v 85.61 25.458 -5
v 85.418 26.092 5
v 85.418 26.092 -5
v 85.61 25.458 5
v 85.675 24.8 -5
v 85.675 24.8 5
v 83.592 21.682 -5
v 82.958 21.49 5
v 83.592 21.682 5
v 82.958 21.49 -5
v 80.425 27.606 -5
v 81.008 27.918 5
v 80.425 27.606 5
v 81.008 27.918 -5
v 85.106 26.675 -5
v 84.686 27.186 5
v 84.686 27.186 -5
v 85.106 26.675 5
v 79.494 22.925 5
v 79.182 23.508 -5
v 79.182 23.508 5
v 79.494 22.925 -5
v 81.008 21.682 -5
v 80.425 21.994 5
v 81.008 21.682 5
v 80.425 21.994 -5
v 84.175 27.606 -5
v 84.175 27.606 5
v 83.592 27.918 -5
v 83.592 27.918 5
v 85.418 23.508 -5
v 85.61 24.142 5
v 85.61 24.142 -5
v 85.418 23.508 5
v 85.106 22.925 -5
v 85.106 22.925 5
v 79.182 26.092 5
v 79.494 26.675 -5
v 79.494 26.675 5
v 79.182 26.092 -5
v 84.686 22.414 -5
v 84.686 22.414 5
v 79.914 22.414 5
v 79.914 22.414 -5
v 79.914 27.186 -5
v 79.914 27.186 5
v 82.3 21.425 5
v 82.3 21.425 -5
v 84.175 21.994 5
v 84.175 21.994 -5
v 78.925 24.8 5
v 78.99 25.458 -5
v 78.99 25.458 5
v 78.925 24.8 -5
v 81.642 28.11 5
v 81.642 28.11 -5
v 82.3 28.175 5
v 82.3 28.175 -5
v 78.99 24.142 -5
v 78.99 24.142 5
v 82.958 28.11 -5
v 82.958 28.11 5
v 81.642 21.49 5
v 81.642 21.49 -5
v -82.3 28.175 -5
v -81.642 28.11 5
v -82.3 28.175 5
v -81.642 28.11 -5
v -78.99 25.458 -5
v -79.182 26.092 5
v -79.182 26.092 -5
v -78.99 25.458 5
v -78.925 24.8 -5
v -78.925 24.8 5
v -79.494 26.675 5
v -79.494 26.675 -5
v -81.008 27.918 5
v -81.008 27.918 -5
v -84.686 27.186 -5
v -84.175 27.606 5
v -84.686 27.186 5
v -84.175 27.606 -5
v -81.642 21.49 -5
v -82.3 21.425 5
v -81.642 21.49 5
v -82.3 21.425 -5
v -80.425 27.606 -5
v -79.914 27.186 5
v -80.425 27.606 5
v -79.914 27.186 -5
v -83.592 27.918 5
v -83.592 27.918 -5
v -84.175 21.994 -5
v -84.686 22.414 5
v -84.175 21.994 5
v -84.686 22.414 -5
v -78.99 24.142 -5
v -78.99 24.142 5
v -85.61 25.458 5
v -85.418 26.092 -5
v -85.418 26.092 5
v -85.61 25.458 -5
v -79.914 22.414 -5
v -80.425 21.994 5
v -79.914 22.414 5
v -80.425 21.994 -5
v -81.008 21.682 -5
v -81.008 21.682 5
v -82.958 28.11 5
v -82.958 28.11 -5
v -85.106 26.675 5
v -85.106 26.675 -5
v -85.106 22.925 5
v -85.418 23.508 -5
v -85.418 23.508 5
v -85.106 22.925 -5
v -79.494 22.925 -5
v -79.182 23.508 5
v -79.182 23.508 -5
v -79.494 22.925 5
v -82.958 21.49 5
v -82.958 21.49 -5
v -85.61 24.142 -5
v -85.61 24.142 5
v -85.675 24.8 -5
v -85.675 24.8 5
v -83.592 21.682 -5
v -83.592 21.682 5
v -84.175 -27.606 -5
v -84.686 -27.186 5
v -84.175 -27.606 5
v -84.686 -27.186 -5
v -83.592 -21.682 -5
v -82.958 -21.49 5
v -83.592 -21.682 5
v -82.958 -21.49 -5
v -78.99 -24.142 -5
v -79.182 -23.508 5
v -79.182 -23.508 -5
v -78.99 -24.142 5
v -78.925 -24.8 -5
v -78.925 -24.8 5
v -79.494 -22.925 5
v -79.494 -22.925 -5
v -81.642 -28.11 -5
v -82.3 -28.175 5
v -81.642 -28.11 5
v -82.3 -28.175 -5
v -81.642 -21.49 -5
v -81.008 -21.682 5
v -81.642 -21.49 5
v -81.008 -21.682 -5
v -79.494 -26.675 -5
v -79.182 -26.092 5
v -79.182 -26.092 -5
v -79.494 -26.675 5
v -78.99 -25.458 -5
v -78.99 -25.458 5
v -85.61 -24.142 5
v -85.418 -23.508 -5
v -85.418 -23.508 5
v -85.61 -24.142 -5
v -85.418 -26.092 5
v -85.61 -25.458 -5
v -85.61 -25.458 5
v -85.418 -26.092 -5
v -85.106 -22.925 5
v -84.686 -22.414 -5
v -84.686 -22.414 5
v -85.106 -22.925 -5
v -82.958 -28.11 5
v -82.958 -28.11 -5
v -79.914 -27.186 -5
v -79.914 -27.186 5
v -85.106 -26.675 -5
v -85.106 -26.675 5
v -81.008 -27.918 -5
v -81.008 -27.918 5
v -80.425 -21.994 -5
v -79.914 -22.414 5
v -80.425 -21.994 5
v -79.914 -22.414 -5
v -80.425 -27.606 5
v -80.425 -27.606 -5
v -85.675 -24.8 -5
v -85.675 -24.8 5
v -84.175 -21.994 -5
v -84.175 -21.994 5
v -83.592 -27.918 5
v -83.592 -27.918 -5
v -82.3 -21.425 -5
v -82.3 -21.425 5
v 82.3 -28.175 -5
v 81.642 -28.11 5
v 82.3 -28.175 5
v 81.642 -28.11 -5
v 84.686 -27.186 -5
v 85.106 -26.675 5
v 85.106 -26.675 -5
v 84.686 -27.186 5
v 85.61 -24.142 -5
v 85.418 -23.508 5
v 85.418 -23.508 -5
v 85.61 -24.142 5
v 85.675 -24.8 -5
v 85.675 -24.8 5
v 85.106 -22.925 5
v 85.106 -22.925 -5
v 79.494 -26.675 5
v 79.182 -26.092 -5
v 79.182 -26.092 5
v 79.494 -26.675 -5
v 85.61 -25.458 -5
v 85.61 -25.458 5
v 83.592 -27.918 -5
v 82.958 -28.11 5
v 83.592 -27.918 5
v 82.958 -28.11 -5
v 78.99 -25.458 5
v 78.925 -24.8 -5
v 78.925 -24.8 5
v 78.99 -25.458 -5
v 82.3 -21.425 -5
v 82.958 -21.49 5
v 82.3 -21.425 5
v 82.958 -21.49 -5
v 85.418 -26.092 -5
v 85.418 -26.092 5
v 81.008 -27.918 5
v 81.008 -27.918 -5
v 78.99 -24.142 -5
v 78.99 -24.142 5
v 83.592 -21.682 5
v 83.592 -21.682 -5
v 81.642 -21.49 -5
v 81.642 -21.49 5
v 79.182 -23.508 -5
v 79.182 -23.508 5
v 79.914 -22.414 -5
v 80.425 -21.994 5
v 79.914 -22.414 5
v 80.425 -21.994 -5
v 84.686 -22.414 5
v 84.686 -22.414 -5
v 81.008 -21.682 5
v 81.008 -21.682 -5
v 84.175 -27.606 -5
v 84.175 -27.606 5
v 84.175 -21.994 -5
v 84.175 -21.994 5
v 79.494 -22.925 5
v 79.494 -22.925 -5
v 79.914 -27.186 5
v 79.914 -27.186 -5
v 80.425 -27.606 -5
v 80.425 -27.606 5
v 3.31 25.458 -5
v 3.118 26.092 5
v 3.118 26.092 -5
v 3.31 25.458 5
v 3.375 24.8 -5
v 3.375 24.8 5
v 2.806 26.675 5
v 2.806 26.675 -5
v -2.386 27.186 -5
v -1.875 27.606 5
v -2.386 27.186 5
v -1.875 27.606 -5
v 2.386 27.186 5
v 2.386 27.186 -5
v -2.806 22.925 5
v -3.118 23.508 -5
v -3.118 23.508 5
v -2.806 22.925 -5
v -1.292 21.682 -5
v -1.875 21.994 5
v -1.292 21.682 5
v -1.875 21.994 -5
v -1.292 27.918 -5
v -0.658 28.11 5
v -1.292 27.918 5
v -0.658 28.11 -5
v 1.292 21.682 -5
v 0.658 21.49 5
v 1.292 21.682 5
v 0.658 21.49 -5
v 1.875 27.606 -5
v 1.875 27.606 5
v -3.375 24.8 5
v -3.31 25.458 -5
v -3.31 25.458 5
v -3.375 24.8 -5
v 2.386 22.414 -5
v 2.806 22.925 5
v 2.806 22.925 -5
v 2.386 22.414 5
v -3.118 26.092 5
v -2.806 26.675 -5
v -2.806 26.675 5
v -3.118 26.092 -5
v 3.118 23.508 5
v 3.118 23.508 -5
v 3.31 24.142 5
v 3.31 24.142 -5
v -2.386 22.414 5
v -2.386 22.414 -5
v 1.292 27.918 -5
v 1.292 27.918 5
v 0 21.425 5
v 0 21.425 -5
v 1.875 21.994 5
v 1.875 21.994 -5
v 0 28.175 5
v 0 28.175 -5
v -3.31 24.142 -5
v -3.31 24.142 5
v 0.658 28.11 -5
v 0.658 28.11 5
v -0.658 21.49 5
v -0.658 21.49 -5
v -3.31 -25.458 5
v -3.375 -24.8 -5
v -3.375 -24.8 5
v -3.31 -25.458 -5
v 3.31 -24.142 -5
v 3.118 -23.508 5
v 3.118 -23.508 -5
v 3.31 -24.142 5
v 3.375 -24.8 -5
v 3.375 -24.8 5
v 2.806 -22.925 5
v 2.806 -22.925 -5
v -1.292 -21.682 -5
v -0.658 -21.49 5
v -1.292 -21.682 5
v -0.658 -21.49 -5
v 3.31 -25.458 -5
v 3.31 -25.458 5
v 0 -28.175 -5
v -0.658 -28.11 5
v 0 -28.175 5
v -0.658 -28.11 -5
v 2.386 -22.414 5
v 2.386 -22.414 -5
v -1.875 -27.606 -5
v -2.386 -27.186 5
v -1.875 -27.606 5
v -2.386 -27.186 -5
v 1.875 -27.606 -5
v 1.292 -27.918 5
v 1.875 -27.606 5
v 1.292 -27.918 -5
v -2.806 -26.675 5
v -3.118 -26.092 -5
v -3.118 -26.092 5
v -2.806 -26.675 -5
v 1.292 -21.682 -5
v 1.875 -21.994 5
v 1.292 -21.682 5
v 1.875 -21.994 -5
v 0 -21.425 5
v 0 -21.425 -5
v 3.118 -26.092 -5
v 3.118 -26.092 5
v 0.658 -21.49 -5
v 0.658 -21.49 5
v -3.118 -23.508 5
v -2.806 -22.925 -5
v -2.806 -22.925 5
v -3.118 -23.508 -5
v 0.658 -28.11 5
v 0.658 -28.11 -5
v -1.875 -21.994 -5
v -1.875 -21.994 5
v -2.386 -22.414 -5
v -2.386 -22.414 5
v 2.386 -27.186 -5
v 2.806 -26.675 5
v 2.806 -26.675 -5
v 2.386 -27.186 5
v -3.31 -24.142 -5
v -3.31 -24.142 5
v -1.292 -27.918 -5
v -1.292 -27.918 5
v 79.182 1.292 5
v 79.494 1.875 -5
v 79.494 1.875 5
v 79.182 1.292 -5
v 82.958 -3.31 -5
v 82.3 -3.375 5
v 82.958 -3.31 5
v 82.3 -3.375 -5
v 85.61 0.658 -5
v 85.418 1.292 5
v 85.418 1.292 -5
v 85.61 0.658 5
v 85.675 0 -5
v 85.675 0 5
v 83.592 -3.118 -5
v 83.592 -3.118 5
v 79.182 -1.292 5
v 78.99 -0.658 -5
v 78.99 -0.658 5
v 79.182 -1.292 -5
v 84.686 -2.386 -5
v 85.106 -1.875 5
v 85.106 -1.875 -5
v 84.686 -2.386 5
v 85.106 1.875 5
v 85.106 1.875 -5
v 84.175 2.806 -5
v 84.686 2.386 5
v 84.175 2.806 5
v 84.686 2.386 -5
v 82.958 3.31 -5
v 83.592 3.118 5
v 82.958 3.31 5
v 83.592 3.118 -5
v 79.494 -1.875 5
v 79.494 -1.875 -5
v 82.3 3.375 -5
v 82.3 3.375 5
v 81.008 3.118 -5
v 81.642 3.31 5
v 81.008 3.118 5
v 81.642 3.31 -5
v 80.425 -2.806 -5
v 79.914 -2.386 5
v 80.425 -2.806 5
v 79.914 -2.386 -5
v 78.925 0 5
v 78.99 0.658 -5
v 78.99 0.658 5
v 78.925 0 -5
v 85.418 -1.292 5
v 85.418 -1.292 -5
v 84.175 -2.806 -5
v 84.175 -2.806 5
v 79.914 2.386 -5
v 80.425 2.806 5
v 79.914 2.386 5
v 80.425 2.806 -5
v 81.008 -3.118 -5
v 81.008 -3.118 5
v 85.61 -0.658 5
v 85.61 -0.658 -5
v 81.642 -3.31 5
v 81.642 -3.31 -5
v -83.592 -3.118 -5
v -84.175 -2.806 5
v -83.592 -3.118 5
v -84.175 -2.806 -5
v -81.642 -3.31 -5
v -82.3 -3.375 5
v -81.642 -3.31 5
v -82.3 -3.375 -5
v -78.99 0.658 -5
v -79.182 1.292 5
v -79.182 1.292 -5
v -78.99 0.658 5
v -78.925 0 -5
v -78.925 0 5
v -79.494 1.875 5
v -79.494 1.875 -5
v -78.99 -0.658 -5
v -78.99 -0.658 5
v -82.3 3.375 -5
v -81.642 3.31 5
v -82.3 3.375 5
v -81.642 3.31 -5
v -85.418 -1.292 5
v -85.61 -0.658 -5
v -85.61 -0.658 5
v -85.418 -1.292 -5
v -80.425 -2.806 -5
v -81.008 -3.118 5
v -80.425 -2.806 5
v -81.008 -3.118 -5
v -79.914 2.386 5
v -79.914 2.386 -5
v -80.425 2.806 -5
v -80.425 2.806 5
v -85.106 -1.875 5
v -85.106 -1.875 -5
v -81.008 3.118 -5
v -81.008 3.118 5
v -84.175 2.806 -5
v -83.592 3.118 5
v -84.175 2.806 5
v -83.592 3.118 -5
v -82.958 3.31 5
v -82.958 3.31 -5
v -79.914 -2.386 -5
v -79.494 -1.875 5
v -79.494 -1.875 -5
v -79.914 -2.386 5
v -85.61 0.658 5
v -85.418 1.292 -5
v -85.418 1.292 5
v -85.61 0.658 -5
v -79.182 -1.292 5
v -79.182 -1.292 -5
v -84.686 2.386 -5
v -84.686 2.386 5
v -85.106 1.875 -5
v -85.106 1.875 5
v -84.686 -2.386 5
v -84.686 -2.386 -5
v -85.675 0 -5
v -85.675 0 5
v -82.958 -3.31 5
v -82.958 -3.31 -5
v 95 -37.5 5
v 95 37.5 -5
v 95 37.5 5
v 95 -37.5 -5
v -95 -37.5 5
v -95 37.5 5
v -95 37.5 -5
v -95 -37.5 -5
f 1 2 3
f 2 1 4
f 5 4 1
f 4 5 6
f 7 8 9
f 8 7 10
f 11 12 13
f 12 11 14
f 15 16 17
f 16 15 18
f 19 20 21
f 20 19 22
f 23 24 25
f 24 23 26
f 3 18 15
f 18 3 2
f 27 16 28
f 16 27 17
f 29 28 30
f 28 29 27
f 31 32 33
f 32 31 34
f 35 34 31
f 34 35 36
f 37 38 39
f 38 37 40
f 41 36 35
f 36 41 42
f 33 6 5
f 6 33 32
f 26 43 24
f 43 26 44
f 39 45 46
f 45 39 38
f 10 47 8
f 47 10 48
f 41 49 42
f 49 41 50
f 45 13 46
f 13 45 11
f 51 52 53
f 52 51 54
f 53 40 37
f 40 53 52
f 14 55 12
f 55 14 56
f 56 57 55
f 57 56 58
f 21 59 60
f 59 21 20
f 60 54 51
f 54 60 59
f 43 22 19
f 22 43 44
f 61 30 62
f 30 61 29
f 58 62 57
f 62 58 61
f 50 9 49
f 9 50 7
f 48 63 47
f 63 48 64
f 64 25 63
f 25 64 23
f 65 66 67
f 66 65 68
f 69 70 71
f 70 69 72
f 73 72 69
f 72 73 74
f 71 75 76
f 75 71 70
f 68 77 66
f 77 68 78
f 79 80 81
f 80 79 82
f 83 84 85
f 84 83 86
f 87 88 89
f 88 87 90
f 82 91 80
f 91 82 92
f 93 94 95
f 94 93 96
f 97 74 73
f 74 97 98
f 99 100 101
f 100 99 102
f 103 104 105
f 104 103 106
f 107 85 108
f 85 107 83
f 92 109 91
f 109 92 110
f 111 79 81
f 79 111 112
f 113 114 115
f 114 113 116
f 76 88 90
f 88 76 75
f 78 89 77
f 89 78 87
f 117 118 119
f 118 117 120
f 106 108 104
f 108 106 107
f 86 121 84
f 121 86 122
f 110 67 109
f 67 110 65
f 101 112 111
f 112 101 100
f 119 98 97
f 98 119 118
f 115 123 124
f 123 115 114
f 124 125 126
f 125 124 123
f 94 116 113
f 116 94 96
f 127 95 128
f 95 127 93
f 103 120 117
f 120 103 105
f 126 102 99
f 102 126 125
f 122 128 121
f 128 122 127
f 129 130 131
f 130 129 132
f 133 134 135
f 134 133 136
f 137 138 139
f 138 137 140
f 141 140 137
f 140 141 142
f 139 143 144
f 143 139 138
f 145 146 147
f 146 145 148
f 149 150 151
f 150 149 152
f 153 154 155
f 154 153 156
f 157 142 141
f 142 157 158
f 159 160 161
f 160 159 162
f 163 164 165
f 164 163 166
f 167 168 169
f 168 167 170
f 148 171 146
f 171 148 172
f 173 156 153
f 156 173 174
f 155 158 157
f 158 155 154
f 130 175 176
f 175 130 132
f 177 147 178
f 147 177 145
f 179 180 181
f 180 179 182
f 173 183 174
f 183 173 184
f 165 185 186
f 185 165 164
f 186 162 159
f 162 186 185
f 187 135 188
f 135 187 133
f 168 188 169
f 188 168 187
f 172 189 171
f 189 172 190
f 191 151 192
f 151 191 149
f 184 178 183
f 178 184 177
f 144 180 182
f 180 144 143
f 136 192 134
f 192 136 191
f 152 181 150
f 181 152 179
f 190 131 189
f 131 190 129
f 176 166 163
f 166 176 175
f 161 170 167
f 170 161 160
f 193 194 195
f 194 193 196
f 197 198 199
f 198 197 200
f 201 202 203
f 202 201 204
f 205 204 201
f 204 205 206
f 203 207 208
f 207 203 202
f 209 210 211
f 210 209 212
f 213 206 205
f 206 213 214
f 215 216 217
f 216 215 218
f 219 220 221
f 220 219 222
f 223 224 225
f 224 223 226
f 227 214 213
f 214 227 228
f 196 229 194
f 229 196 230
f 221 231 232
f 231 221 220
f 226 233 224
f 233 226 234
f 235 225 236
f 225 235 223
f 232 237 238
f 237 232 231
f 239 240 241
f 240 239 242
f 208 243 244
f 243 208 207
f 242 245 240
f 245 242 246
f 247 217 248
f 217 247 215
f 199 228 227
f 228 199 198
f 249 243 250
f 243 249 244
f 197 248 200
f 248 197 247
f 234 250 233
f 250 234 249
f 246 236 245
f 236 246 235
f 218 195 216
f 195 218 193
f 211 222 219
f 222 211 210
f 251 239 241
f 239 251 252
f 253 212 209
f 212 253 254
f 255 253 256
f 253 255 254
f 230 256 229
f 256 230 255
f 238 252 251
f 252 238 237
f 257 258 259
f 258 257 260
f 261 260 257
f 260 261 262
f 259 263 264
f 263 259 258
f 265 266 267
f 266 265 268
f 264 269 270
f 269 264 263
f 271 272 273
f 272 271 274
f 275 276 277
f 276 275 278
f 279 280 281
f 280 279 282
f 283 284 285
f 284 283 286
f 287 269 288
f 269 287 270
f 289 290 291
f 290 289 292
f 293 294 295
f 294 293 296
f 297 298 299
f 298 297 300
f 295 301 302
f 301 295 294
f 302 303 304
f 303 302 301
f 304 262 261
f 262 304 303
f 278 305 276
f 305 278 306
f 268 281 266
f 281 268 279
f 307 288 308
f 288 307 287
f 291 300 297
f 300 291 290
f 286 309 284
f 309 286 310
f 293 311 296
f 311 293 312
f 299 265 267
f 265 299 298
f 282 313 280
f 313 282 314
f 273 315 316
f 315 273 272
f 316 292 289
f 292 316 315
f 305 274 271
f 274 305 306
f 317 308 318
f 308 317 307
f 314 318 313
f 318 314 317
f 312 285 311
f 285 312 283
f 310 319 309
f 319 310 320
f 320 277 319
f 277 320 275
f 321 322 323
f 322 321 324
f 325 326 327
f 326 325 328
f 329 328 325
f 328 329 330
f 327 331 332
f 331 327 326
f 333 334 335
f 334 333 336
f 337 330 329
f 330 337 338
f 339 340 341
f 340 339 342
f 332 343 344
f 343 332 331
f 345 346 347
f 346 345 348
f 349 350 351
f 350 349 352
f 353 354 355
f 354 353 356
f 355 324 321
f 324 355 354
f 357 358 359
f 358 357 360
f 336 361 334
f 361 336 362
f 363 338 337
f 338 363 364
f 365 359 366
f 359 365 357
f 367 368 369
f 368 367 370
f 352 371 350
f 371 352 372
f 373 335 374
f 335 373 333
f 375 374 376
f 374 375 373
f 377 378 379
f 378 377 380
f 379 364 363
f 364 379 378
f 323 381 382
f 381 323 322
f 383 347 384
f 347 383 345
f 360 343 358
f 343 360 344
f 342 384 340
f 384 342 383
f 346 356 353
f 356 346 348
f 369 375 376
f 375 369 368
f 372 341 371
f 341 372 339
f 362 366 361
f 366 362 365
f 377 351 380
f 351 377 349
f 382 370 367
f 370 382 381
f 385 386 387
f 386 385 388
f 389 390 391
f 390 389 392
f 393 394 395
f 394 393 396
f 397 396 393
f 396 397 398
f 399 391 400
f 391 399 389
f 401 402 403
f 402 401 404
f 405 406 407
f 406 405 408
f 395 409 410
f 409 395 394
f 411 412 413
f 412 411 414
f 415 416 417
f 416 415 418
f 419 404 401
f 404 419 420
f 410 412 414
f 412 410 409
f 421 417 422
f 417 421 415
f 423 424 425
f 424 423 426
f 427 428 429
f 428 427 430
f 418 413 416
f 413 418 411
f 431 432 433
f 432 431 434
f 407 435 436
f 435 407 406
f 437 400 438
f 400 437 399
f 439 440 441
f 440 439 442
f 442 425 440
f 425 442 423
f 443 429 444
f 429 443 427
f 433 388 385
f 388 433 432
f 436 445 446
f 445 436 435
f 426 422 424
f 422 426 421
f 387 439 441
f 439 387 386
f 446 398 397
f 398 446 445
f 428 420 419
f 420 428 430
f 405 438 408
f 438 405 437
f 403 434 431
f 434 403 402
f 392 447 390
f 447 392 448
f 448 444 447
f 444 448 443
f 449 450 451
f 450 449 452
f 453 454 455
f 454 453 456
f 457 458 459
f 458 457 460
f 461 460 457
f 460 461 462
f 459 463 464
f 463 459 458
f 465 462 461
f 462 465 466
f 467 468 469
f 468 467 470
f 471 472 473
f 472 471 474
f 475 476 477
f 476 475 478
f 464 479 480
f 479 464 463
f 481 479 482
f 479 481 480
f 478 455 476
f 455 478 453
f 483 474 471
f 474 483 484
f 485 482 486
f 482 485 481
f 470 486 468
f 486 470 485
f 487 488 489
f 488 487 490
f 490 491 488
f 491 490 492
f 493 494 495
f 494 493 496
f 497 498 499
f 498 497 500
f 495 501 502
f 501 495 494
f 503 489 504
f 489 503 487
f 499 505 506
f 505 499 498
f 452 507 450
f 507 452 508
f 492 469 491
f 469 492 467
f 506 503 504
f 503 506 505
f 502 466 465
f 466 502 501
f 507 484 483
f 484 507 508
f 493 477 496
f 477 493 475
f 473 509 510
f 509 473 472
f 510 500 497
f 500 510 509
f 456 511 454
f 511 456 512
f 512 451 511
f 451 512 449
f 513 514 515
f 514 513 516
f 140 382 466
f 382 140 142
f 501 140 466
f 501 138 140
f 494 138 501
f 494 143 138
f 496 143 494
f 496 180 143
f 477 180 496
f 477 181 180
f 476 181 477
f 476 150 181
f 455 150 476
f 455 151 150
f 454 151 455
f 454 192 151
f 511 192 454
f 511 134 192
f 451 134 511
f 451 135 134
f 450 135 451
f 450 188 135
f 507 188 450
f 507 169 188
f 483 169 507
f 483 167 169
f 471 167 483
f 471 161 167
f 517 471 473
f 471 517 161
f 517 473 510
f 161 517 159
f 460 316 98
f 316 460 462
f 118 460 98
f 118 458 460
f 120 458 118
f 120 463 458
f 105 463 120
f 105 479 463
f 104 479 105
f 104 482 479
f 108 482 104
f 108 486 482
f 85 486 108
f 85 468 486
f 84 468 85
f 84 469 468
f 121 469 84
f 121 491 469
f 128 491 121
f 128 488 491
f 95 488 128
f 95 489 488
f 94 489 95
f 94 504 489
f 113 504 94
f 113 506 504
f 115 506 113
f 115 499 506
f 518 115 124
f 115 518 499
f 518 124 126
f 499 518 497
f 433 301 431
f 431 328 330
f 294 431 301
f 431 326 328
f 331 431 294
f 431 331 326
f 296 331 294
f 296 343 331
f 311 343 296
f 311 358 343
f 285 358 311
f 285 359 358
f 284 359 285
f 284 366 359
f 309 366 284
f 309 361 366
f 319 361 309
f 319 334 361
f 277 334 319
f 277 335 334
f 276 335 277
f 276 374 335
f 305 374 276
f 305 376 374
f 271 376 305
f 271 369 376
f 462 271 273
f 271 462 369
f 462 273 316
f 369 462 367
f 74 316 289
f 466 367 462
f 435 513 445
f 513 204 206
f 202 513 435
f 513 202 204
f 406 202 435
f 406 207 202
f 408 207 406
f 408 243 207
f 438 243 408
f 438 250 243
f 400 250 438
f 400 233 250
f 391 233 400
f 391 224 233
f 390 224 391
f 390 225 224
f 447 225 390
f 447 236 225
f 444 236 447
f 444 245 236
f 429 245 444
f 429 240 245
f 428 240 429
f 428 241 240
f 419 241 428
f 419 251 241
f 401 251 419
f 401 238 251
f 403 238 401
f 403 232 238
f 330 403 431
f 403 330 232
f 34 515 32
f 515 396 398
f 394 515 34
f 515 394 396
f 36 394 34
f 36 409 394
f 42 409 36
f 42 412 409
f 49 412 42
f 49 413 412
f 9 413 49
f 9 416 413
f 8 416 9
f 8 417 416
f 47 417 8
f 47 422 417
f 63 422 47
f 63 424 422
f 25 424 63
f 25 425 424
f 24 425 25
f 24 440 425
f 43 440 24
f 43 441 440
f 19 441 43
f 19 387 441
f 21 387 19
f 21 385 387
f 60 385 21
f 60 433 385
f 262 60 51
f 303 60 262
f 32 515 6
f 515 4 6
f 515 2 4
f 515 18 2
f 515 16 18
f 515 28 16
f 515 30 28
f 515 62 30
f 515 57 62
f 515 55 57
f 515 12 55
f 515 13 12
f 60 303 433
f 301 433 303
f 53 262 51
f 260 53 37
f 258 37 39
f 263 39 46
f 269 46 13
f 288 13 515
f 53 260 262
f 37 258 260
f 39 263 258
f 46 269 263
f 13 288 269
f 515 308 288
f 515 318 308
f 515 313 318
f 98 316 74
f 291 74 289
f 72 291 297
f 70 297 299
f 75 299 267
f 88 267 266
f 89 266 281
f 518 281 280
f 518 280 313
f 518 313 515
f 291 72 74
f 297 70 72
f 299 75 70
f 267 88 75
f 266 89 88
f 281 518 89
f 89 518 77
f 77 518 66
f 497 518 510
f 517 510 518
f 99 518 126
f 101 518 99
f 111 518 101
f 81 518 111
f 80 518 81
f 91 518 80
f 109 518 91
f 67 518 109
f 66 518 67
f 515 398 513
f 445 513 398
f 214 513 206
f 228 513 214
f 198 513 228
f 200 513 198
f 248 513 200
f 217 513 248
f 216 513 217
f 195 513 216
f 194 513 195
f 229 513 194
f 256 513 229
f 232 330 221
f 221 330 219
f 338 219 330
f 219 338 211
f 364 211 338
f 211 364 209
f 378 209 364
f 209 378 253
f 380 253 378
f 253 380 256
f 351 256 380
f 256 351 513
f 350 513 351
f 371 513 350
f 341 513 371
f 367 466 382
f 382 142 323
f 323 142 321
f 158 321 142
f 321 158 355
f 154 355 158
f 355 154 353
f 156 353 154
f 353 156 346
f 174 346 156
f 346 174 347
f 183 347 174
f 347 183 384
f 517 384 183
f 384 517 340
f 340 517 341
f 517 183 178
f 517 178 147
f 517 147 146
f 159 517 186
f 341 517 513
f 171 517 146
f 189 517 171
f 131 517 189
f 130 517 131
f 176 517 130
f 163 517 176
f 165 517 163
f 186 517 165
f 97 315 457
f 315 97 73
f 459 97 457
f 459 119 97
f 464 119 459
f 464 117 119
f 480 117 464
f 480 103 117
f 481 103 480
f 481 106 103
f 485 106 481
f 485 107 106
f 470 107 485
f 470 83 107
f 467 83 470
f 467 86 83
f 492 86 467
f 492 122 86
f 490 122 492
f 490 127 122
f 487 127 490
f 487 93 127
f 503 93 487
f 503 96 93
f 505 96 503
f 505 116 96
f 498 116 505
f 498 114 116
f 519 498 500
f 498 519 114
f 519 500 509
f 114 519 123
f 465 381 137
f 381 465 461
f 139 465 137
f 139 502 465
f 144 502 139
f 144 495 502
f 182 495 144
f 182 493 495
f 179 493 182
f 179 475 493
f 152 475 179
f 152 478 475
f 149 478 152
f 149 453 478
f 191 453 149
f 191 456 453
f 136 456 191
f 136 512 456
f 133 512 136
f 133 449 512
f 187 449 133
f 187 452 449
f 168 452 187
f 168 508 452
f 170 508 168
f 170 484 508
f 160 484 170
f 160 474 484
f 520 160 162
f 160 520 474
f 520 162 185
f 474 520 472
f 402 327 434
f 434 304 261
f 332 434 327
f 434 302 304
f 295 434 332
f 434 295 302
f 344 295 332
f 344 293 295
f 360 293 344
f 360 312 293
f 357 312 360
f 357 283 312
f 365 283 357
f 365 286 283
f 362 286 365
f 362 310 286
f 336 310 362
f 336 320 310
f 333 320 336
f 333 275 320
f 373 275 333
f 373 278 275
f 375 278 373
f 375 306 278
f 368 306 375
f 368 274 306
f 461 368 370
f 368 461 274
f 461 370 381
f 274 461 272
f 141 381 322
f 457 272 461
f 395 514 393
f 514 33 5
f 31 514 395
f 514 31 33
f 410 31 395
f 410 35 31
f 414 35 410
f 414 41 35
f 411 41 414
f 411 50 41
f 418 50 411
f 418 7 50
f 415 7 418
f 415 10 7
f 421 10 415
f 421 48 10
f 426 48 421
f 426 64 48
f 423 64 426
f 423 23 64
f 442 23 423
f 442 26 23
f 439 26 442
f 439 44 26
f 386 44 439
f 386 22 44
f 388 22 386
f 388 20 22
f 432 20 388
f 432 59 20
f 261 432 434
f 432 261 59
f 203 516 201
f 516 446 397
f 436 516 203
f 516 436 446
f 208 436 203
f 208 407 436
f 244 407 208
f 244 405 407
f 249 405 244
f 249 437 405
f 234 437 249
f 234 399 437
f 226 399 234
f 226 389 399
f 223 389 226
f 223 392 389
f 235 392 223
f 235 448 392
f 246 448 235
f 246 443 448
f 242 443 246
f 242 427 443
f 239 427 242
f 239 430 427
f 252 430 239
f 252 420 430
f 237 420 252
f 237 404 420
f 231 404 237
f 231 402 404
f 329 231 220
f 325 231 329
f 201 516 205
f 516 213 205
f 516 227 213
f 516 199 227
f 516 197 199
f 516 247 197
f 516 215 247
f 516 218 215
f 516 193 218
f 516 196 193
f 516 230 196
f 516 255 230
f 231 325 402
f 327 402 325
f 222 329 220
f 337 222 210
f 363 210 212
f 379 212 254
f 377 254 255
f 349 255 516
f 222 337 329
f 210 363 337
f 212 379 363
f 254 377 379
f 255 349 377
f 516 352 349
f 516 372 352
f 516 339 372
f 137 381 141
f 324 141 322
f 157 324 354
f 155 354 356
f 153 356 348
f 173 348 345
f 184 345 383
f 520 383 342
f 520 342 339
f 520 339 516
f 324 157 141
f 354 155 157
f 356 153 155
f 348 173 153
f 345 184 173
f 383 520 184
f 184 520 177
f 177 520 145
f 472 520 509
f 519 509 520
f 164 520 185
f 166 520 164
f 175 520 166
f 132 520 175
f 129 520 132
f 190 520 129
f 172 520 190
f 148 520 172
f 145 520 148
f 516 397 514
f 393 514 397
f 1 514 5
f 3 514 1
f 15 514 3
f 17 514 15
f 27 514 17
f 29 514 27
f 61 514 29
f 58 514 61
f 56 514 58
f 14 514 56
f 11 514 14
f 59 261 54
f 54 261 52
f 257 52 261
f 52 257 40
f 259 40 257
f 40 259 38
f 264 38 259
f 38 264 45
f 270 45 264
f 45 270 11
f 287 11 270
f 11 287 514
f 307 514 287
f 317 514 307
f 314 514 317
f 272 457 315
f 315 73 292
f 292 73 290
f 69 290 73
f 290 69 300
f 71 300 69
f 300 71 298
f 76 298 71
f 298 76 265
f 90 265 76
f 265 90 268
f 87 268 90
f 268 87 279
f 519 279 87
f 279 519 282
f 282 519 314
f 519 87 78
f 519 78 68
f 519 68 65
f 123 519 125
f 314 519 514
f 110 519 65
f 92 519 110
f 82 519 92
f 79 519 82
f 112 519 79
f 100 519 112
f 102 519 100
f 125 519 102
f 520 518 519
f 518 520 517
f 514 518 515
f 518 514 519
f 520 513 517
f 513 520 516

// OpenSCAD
$fn = 32;

// ----------------------------------------------------------------------
// Corner plate 190 x 75 x 10
// 8 holes, centres taken from the edge offset
// ----------------------------------------------------------------------

// --- parameters (mm) ---
plate = [190, 75, 10];   // overall size (x, y, z)
holes = 8;               // number of holes the drawing asks for
bore_d = 6.6;            // nominal hole diameter from the drawing
print_allowance = 0.15;  // clearance added for printing
edge = 12.7;             // hole centre offset from the plate edge

// --- derived feature positions (mm) ---
hole_d = bore_d + print_allowance;  // = 6.75   hole diameter as printed
corner_x = plate[0] / 2 - edge;     // = 82.3   corner hole X
corner_y = plate[1] / 2 - edge;     // = 24.8   corner hole Y
feature_centers = [
  [corner_x, corner_y],
  [-corner_x, corner_y],
  [-corner_x, -corner_y],
  [corner_x, -corner_y],
  [0, corner_y],
  [0, -corner_y],
  [corner_x, 0],
  [-corner_x, 0]
];   // hole centres the loop below drills

// plate outline, every hole drilled through with the same cutters
difference() {
  cube(plate, center = true);
  for (centre = feature_centers)
    translate([centre[0], centre[1], 0])
      cylinder(d = hole_d, h = plate[2] + 2, center = true);
}
